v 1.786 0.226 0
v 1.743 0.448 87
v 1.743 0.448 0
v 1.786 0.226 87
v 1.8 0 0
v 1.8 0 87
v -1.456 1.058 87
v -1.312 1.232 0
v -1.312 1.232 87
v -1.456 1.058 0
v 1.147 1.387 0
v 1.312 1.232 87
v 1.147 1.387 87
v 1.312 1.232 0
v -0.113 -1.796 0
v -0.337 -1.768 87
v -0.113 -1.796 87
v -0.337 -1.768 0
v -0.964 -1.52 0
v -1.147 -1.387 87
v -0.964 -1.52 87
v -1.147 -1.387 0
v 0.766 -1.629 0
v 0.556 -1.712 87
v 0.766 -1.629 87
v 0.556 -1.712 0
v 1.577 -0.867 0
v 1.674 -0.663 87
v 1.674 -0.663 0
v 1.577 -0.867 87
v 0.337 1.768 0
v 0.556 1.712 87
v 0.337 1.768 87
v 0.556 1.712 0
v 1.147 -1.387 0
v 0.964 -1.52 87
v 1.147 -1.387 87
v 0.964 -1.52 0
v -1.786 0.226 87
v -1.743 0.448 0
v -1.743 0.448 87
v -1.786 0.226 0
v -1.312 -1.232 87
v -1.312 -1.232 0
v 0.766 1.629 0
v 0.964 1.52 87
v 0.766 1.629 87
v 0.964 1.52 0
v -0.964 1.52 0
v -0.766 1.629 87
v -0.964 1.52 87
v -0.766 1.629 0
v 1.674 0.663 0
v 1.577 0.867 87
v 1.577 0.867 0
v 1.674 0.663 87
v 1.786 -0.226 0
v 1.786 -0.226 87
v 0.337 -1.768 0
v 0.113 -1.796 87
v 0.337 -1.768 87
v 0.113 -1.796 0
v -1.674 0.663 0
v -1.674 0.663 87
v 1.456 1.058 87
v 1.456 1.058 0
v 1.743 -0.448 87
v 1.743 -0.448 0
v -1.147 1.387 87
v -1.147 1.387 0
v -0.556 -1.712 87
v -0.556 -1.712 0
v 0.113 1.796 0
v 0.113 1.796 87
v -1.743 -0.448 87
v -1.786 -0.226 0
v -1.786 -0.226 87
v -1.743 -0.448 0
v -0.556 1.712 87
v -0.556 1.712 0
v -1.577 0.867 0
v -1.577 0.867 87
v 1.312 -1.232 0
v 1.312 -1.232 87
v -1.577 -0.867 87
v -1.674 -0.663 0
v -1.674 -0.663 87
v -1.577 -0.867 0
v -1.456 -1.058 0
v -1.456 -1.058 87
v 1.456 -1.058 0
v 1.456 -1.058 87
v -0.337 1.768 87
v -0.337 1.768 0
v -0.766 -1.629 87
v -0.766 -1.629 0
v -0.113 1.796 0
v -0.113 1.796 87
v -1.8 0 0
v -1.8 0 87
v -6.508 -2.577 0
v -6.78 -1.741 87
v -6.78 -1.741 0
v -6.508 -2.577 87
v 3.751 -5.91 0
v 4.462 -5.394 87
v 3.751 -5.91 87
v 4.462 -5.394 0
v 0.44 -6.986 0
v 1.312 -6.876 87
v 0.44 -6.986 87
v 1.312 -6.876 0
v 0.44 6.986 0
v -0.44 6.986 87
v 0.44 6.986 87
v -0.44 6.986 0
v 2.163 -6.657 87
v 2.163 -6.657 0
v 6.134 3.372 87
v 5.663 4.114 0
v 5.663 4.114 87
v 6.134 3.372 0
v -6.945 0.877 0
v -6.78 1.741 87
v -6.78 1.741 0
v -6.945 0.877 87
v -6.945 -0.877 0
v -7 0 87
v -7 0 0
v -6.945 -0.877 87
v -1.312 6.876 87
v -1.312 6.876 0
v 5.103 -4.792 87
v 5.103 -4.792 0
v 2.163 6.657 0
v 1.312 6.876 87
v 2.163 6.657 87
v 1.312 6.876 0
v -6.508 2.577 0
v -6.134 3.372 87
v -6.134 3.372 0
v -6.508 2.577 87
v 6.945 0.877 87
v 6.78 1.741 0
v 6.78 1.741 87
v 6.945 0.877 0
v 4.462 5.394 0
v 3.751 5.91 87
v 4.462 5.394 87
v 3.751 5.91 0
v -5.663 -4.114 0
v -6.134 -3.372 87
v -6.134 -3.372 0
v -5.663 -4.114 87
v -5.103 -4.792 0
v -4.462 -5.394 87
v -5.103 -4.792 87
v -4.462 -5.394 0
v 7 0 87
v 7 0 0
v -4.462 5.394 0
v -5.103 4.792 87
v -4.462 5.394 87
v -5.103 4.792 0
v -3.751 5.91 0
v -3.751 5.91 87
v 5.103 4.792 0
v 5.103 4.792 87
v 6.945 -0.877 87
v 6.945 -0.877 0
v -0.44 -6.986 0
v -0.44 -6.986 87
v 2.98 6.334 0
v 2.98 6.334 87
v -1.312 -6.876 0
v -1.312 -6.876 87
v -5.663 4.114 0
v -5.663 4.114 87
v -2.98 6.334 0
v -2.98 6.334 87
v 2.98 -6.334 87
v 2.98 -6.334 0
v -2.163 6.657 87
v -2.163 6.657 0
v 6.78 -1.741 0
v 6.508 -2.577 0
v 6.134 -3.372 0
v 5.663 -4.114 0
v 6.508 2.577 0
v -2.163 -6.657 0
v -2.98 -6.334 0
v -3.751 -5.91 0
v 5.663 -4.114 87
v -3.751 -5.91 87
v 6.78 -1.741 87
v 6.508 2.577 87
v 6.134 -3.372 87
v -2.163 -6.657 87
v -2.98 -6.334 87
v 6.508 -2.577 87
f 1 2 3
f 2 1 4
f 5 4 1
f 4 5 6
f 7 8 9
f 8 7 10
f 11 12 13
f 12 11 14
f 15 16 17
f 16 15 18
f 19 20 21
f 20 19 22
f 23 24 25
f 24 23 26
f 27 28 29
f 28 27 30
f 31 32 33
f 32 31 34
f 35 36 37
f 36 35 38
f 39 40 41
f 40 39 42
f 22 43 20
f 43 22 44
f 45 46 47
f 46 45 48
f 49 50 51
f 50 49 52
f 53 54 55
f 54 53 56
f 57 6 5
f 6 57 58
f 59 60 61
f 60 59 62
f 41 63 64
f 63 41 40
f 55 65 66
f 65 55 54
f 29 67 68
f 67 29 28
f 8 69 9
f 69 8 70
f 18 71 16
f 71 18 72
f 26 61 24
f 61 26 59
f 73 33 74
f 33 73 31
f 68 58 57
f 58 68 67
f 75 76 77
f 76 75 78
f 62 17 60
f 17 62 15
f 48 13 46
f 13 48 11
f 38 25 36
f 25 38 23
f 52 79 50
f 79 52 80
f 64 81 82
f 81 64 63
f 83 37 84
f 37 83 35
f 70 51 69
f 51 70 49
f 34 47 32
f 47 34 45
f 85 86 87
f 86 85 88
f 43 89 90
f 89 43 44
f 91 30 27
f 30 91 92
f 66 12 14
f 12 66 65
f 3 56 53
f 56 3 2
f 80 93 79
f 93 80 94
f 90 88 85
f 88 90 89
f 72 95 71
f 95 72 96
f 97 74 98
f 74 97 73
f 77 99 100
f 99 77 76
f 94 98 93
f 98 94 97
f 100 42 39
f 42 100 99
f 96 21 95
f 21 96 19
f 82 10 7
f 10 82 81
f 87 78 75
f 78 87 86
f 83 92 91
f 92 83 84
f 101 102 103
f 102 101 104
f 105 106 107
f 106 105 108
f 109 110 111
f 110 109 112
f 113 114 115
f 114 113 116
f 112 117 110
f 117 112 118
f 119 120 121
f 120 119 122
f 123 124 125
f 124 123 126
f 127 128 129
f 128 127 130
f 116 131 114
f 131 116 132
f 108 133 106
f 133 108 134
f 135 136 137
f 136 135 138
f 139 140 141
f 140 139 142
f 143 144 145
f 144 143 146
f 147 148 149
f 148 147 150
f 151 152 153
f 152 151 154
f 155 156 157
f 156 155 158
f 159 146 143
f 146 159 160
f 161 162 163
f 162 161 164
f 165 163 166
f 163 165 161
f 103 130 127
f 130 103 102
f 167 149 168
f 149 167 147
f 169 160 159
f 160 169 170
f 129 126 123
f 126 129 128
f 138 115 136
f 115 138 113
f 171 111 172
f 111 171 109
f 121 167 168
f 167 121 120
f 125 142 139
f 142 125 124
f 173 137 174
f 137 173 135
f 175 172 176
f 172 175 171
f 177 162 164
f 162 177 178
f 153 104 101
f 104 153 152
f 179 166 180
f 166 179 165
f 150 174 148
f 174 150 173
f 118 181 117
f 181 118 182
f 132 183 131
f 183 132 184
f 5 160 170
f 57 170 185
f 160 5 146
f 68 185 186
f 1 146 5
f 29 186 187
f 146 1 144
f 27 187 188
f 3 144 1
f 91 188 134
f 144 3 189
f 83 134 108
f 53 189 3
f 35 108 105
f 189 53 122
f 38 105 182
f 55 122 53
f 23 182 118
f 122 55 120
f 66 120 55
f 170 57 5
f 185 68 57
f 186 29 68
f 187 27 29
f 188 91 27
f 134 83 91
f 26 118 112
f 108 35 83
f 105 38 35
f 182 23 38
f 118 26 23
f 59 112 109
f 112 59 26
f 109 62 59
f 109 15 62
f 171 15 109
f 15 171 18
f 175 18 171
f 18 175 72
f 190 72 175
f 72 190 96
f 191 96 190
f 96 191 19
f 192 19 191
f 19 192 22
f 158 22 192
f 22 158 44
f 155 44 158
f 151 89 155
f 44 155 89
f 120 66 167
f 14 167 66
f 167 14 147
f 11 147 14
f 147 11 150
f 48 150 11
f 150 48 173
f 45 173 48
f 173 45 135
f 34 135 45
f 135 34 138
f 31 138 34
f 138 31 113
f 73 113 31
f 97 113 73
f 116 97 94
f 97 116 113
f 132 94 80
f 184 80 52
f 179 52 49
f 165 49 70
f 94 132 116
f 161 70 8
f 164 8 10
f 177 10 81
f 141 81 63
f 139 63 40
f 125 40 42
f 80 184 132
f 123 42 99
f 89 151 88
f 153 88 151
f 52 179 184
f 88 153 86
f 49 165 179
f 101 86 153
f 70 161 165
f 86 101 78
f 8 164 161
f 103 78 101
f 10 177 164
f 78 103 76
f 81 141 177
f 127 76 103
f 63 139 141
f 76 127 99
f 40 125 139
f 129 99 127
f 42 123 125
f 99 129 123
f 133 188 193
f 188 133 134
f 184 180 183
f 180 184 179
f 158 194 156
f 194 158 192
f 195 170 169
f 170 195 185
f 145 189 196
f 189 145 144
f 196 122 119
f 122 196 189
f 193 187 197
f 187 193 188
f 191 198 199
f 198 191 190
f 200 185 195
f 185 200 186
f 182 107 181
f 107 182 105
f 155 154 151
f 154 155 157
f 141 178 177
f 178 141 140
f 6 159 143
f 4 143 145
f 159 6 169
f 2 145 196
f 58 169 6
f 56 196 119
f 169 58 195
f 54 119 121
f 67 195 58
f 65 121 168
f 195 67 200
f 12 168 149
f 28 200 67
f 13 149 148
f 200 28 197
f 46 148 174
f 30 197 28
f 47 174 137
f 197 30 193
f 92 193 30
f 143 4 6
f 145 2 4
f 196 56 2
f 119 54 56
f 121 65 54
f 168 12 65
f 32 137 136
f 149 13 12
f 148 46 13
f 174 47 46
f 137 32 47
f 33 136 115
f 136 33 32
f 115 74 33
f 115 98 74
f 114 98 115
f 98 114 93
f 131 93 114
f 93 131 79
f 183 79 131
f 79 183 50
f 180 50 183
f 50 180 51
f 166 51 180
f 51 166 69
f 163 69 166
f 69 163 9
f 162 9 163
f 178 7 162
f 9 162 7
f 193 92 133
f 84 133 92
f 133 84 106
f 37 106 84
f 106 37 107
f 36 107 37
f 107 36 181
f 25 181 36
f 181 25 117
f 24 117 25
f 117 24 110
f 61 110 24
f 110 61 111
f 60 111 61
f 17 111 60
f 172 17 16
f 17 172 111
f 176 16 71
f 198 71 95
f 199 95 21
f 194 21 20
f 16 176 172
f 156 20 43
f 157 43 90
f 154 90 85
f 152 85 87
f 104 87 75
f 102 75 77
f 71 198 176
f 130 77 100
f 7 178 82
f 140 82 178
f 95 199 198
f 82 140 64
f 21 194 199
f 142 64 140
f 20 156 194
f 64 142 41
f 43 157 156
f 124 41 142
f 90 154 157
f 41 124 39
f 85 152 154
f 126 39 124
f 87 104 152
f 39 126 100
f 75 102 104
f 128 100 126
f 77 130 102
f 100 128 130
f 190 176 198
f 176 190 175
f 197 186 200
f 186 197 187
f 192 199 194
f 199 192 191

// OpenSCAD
$fn = 50;


difference() {
	union() {
		cylinder(h = 87, r = 7.0000000000);
	}
	union() {
		translate(v = [0, 0, -100]) {
			cylinder(h = 200, r = 1.8000000000);
		}
		translate(v = [0, 0, -100]) {
			cylinder(h = 200, r = 1.8000000000);
		}
	}
}
